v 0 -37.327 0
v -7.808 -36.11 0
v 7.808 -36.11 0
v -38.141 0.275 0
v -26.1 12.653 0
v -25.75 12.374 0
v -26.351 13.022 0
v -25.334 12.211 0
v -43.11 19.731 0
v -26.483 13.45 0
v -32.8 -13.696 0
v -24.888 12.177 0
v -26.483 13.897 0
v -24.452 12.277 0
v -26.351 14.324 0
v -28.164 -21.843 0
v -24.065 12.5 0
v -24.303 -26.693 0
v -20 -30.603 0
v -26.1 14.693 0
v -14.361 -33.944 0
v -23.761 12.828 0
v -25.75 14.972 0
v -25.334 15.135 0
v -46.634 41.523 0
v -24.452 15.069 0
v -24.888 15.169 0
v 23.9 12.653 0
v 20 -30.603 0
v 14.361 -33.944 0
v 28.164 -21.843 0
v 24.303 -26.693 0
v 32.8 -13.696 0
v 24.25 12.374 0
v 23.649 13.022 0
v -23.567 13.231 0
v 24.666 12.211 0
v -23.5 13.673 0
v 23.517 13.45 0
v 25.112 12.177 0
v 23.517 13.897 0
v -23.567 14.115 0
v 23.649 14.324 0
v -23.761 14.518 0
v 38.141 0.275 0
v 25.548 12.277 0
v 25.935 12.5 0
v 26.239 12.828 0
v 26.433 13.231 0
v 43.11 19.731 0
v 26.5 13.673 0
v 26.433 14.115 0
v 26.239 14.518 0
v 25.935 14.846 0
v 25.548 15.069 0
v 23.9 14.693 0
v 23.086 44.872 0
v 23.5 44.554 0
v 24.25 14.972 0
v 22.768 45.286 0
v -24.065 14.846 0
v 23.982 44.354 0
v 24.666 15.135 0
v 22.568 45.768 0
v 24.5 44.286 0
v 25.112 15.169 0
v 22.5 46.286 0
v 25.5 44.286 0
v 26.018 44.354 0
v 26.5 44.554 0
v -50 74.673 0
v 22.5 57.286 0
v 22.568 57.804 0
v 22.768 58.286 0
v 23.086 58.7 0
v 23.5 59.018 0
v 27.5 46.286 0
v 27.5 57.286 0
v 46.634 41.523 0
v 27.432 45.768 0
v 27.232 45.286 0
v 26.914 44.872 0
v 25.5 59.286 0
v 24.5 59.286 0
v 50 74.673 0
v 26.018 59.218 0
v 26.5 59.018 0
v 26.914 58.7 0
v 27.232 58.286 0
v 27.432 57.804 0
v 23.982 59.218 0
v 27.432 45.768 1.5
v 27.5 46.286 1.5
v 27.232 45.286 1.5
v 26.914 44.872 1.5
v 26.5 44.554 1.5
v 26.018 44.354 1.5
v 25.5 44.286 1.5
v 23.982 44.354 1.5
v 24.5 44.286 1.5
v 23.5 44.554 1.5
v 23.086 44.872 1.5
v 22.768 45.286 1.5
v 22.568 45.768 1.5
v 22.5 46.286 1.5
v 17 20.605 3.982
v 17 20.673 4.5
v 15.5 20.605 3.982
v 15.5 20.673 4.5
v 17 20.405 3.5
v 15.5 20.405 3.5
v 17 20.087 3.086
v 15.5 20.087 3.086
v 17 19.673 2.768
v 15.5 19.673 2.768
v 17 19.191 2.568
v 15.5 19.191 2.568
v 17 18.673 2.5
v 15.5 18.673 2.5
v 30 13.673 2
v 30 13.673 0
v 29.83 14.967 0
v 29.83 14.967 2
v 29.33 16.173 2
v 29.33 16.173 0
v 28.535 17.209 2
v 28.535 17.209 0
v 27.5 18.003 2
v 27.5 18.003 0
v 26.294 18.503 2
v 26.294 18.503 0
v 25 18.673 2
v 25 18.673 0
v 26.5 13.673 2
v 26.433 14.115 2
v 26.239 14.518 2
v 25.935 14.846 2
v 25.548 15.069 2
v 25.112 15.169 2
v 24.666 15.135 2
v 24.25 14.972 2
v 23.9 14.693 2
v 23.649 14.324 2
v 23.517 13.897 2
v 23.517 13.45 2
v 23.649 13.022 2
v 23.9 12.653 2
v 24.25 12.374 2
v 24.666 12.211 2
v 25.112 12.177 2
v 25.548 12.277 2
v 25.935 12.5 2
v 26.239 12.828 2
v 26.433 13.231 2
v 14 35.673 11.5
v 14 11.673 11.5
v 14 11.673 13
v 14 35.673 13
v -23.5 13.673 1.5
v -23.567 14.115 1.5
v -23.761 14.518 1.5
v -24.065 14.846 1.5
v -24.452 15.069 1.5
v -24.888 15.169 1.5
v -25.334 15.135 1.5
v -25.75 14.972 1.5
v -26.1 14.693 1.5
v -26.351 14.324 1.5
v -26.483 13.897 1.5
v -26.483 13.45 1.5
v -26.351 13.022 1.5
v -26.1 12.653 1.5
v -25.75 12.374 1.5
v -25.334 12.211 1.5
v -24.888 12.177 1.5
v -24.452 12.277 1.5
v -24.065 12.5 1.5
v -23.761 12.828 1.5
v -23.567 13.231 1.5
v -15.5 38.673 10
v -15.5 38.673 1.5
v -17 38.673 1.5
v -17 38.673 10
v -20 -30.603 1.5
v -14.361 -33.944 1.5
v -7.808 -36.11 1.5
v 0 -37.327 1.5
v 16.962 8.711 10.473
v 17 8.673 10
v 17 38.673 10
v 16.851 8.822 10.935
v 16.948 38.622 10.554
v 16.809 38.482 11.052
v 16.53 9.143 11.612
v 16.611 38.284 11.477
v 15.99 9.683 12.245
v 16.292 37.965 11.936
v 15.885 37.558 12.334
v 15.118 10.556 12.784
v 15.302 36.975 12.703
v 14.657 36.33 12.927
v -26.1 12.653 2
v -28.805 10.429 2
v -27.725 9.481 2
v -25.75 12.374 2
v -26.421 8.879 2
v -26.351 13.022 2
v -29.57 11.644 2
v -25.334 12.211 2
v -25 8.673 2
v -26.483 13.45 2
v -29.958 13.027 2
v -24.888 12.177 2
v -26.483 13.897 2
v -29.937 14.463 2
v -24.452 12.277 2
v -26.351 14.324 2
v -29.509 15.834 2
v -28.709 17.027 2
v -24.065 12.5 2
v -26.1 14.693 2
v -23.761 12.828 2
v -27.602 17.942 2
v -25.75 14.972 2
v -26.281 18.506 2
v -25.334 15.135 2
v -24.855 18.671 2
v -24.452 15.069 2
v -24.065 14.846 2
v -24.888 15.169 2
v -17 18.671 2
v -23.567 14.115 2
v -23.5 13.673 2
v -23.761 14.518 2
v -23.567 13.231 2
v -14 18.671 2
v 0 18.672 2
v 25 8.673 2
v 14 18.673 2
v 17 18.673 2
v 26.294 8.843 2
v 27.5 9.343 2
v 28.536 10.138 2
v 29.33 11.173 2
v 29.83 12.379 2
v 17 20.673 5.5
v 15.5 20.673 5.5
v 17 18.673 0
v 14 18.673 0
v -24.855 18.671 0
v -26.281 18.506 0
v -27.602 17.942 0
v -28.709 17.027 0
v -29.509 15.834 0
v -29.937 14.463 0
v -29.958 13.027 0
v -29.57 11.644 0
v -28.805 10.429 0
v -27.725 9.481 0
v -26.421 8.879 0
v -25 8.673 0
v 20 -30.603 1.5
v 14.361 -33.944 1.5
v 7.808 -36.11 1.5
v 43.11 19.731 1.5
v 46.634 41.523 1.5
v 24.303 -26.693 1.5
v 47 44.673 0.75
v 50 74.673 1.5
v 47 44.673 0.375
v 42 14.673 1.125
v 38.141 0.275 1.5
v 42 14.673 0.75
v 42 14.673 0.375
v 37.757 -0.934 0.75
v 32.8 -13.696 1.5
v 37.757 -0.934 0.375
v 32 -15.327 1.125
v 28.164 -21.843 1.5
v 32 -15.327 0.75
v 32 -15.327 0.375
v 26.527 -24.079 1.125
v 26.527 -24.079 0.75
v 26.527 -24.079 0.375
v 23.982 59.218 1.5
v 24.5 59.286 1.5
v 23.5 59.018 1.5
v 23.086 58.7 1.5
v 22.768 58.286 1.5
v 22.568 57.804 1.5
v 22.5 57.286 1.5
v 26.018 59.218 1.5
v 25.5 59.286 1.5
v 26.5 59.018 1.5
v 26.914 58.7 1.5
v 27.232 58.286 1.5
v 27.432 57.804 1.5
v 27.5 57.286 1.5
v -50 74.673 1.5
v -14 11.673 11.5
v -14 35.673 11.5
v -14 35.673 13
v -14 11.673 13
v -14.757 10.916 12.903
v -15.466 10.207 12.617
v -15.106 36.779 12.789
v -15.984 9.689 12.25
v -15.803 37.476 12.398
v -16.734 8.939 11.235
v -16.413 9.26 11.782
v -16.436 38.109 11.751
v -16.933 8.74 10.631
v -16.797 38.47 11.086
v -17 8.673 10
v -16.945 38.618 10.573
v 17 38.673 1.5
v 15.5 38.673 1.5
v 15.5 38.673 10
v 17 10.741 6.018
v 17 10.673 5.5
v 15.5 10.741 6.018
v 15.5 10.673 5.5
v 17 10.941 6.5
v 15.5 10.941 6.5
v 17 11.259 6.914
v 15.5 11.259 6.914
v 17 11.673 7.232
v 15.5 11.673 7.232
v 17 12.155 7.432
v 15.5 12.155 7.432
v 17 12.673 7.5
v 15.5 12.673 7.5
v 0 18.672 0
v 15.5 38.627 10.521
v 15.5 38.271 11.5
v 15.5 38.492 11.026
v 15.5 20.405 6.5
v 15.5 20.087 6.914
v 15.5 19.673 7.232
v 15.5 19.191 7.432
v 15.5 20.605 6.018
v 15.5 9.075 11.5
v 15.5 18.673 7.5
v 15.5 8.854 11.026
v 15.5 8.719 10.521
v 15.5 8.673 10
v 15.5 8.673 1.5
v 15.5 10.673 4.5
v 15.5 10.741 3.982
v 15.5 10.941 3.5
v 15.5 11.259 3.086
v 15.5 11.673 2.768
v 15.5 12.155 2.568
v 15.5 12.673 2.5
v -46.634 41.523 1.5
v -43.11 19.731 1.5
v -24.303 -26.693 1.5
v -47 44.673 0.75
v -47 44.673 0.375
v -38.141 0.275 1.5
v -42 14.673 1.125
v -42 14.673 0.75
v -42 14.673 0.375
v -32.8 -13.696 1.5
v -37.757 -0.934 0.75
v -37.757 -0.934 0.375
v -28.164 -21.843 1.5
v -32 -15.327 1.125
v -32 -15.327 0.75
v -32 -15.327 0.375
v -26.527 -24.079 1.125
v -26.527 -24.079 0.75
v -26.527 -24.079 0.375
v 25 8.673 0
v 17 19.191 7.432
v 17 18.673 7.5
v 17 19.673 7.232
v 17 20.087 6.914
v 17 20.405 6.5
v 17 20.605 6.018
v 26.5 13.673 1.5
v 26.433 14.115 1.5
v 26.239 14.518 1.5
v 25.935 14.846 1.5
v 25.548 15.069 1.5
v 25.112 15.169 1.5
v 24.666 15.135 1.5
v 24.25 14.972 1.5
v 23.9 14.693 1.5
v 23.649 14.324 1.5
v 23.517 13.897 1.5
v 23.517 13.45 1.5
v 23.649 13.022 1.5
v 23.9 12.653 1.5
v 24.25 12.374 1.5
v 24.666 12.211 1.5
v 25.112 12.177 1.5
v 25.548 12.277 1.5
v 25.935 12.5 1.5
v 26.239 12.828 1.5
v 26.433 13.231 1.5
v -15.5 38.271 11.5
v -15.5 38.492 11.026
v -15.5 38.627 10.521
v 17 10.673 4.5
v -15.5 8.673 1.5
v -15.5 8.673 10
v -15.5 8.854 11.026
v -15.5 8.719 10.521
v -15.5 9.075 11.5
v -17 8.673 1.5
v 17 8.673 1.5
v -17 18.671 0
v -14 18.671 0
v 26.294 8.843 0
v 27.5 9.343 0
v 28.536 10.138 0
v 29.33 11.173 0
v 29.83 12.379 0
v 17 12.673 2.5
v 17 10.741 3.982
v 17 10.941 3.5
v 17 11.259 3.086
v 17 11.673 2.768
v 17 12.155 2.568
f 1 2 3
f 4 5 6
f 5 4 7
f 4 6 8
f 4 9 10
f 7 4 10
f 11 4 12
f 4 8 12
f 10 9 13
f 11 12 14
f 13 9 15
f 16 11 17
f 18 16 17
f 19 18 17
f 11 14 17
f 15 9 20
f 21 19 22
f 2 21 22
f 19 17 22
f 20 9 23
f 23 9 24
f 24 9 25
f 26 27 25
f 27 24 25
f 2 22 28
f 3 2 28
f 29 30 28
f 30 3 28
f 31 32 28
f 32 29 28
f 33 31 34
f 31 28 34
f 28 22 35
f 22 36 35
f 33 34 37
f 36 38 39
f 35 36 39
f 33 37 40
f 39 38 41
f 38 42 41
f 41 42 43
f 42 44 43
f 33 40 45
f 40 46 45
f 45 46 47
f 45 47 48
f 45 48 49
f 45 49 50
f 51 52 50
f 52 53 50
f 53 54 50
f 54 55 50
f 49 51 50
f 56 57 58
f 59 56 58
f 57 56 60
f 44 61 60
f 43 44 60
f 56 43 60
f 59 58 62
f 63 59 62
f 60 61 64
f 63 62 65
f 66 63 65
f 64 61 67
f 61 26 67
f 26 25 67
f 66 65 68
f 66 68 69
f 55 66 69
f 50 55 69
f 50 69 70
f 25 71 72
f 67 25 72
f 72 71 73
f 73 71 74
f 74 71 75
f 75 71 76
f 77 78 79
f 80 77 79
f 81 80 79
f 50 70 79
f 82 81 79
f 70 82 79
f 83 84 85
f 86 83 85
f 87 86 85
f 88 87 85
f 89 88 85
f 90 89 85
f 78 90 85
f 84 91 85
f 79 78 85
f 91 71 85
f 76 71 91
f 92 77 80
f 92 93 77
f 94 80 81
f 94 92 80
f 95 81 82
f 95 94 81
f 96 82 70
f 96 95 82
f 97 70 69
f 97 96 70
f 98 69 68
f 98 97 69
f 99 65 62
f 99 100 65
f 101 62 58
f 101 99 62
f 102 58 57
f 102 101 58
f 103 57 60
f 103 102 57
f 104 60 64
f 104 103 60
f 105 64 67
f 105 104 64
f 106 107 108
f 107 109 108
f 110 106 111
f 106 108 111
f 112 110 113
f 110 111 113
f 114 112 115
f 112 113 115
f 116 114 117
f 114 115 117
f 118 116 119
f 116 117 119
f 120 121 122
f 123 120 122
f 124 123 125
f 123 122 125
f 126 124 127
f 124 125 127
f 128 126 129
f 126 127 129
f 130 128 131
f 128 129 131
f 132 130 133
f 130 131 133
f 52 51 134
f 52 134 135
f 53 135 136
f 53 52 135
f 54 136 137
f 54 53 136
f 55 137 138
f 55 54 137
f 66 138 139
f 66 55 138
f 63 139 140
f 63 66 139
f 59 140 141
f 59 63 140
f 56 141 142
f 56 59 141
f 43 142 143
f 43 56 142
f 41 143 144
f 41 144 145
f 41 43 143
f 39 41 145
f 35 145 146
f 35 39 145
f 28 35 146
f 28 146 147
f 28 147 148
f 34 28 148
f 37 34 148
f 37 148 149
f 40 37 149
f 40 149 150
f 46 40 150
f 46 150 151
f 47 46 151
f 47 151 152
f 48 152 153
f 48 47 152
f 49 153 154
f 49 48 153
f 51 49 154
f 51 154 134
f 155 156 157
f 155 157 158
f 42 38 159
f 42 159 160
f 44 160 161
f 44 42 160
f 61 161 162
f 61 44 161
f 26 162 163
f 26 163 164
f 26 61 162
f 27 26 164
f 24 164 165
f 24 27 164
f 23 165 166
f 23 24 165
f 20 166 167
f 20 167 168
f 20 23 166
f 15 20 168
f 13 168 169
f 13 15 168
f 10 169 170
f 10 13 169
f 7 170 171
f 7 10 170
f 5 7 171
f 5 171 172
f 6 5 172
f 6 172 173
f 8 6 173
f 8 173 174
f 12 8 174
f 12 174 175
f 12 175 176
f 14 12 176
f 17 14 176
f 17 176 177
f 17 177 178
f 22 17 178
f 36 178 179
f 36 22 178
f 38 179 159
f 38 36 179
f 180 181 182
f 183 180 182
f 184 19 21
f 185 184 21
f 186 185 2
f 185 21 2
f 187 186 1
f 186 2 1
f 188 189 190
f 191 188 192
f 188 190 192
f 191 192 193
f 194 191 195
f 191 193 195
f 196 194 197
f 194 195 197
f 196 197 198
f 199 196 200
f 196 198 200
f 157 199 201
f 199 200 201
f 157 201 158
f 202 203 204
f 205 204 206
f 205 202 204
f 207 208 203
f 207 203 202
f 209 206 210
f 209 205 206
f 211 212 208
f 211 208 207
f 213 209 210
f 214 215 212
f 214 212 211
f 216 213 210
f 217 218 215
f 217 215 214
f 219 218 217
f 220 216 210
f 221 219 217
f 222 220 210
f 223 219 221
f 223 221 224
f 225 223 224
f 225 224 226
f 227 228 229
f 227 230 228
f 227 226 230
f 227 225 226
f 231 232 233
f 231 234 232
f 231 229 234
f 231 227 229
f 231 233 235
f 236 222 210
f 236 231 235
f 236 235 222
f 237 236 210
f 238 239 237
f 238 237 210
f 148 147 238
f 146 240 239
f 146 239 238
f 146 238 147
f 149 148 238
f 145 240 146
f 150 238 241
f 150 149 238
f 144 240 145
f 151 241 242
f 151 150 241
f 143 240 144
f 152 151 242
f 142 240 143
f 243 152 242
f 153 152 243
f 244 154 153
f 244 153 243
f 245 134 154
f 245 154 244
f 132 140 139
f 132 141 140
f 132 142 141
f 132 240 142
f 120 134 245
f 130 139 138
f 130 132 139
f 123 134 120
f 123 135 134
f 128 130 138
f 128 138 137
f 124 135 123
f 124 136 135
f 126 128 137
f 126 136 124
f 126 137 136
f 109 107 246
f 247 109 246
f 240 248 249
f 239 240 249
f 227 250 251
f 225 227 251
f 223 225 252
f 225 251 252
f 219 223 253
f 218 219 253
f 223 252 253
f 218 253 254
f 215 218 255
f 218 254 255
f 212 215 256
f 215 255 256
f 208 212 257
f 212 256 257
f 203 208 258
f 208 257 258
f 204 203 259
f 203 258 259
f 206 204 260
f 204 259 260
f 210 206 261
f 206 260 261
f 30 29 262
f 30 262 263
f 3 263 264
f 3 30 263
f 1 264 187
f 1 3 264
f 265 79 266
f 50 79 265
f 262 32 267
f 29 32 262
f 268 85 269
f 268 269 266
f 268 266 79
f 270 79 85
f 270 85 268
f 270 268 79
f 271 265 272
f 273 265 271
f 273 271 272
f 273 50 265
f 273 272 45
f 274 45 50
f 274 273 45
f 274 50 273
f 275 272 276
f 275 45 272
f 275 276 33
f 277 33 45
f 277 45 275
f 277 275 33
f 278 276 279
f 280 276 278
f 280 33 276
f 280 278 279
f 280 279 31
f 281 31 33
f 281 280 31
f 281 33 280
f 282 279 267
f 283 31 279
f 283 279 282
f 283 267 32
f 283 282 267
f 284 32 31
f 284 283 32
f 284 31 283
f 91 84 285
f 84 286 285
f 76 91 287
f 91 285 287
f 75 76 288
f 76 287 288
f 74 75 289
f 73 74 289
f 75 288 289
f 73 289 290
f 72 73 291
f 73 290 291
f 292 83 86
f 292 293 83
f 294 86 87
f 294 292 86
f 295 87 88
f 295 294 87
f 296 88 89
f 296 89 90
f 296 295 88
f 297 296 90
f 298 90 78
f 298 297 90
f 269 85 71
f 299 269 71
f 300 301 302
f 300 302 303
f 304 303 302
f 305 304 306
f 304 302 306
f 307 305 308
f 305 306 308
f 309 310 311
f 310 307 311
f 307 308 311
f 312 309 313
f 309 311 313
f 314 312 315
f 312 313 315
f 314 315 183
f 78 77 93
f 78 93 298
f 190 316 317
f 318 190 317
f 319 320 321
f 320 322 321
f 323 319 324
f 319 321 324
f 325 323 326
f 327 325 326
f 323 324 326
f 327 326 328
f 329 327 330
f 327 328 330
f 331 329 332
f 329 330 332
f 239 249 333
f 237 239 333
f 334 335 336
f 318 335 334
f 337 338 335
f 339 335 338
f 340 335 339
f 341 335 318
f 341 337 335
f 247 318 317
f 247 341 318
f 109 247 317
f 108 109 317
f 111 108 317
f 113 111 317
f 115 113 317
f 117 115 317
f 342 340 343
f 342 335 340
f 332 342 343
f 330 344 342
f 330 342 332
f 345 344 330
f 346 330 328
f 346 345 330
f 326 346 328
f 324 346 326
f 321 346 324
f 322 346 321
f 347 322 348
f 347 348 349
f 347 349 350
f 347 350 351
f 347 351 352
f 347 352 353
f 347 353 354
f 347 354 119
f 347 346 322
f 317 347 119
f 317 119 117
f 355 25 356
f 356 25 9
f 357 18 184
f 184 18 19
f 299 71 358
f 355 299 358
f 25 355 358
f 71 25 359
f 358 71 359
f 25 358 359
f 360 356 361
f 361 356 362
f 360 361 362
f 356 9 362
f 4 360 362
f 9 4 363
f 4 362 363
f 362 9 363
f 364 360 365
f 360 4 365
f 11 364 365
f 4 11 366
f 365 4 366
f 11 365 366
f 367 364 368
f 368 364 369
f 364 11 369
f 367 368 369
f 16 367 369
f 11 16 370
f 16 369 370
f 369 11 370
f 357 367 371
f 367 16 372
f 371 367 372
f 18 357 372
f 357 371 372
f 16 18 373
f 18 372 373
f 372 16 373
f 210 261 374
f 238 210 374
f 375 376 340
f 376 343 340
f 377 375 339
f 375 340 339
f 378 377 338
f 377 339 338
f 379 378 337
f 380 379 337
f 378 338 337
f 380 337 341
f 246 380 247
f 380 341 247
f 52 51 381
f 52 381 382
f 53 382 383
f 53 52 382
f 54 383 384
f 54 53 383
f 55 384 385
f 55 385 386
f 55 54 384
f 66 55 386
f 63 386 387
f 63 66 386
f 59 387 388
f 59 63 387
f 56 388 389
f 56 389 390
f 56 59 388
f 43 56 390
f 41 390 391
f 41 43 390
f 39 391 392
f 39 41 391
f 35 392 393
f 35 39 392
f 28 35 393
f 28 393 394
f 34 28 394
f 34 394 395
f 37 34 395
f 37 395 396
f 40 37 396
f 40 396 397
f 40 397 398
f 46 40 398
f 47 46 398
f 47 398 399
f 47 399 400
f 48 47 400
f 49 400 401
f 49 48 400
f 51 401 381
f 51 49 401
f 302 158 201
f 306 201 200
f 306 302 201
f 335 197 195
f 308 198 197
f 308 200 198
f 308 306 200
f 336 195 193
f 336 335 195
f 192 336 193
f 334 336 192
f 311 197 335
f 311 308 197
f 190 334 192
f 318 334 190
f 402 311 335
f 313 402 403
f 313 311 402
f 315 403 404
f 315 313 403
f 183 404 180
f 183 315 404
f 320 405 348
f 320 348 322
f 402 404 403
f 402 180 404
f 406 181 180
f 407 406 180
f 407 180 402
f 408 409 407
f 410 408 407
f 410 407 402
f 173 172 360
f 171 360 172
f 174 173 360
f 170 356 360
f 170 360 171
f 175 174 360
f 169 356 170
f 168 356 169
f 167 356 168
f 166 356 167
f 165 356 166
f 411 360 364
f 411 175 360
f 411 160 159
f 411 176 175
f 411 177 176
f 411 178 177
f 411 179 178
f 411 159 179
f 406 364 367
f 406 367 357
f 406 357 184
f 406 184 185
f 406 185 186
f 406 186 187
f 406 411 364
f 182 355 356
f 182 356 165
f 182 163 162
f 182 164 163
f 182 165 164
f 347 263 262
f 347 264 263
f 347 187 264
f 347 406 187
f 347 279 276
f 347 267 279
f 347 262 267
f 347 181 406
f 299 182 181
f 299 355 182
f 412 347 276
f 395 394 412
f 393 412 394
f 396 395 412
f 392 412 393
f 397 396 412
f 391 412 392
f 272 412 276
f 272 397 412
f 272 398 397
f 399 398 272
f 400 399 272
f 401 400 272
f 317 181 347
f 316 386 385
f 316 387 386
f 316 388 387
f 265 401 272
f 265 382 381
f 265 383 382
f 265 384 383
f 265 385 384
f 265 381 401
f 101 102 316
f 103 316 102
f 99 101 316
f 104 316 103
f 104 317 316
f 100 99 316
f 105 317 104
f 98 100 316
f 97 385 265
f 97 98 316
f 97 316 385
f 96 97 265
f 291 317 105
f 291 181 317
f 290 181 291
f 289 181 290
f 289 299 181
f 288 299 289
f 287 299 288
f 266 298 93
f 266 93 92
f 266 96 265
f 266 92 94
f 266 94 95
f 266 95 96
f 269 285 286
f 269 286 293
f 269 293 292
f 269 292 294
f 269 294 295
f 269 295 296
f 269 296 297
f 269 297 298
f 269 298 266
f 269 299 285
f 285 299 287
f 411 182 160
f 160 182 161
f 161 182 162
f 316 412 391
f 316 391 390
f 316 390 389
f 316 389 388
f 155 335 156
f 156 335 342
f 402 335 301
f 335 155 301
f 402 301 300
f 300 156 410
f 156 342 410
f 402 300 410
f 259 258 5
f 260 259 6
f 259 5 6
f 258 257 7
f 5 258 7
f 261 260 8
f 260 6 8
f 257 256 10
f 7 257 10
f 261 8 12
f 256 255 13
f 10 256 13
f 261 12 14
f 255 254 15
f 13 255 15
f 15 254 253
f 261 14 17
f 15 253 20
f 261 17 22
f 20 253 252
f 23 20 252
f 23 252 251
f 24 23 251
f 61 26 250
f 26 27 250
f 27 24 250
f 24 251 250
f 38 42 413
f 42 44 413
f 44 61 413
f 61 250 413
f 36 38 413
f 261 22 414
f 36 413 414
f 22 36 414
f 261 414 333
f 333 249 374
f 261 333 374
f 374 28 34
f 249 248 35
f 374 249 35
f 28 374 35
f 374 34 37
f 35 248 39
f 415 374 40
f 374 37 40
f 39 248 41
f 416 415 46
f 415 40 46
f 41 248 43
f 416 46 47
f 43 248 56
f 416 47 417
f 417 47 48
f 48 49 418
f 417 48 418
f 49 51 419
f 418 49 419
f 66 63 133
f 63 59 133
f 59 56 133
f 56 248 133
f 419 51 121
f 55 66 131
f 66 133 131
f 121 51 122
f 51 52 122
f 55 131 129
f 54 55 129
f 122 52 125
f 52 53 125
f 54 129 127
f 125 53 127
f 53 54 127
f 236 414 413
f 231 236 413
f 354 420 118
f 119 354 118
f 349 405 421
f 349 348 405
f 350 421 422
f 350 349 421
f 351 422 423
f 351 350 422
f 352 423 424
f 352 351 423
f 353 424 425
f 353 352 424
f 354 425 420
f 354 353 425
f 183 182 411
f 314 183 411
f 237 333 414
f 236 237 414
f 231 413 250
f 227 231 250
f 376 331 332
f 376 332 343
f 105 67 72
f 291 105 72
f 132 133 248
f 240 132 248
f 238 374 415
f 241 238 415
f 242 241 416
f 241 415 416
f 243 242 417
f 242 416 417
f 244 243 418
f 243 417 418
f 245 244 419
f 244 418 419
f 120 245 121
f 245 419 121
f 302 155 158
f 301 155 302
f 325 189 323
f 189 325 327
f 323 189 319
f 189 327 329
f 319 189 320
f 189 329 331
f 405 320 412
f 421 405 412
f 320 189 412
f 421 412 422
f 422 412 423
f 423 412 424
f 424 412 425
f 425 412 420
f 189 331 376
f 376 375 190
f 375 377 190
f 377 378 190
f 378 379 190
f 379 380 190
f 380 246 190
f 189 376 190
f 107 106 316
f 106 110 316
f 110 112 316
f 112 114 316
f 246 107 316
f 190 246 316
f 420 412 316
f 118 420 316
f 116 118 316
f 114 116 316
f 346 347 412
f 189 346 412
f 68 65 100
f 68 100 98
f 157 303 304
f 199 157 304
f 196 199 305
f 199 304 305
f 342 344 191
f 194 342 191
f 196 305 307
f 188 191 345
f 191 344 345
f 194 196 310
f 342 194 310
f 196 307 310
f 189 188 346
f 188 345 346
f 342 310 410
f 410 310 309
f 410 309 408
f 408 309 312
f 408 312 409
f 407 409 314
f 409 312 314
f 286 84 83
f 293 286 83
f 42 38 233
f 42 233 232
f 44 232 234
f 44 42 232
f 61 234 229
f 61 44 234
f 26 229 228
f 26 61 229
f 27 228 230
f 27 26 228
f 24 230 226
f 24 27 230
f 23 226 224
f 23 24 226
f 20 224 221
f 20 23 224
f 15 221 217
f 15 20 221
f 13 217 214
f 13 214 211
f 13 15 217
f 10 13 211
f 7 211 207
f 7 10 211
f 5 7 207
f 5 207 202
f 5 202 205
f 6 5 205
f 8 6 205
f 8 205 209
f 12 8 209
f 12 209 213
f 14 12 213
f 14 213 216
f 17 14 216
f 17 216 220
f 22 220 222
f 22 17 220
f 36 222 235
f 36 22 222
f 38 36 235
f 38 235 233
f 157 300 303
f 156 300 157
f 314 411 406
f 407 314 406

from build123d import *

# Parameters (mm, degrees)
F0_R        = 6
F0_W        = 5
F0_H        = 15
F0_R_2      = 3
F0_R_3      = 1.5
F1_DEPTH    = 1.5
F2_DEPTH    = 13
F3_T        = -1.5
F4_T1_DEPTH = 45
F4_T3_DEPTH = 49
F5_R        = 2
F6_DEPTH    = 2
F7_START    = 3
F7_DEPTH    = 22
F8_W        = 10
F8_H        = 5
F9_DEPTH    = 5
F10_R       = 2


# Not quite as in the source:
# - a fillet or chamfer that OpenCascade refuses, or shapes differently, is made with other operations: its cross-section is extruded or revolved along the edge and cut away or added


with BuildPart() as f1:
    # F0 (on Top) → F1 (new body)
    with BuildSketch(Plane.XY):
        with BuildLine():
            Line((50, 74.6730720997), (0, 74.6730720997))
            Line((0, 74.6730720997), (0, 69.6730720997))
            Line((0, 69.6730720997), (0, 64.6730720997))
            Line((0, 64.6730720997), (0, 38.6730720997))
            Line((0, 38.6730720997), (17, 38.6730720997))
            Line((17, 38.6730720997), (17, 18.6727328867))
            Line((17, 18.6727328867), (24.9997879891, 18.6730720952))
            ThreePointArc((24.9997879891, 18.6730720952), (28.535458948, 17.208680962), (30, 13.6730720997))
            ThreePointArc((30, 13.6730720997), (28.5355339059, 10.1375381938), (25, 8.6730720997))
            Line((25, 8.6730720997), (17, 8.6730720997))
            Line((17, 8.6730720997), (0, 8.6730720997))
            Line((0, 8.6730720997), (0, 7.6730720997))
            Line((0, 7.6730720997), (20, 7.6730720997))
            Line((20, 7.6730720997), (20, -1.4825001728))
            ThreePointArc((20, -1.4825001728), (23.3406734607, -3.5949503292), (24.642552197, -7.3269279003))
            ThreePointArc((24.642552197, -7.3269279003), (23.3406734607, -11.0589054714), (20, -13.1713556278))
            Line((20, -13.1713556278), (20, -30.6029154708))
            add(Edge.make_bspline(
                [(50, 74.6730720997), (49.0459845068, 66.9929651356), (47.3037907792, 43.380231158), (42.8042626578, 15.237762147), (33.9460152145, -15.0102641191), (24.7180314416, -27.0363946308), (20, -30.6029154708)],
                knots=[0, 0, 0, 0, 0.2142082733, 0.4293529985, 0.6487321082, 0.8142938826, 0.8142938826, 0.8142938826, 0.8142938826], degree=3))
        make_face()
        with Locations((29.4684451073, 27.5630913675)):
            Circle(F0_R, mode=Mode.SUBTRACT)
        with Locations((15, 61.6730720997)):
            Circle(F0_R, mode=Mode.SUBTRACT)
        with Locations((25, 51.7858859897)):
            Rectangle(F0_W, F0_H, mode=Mode.SUBTRACT)
        with Locations((35, 61.6730720997)):
            Circle(F0_R, mode=Mode.SUBTRACT)
        with BuildLine():
            Line((0, 69.6730720997), (0, 74.6730720997))
            Line((0, 74.6730720997), (-50, 74.6730720997))
            add(Edge.make_bspline(
                [(-50, 74.6730720997), (-49.0459845068, 66.9929651356), (-47.3037907792, 43.380231158), (-42.8042626578, 15.237762147), (-33.9460152145, -15.0102641191), (-24.7180314416, -27.0363946308), (-20, -30.6029154708)],
                knots=[0, 0, 0, 0, 0.2142082733, 0.4293529985, 0.6487321082, 0.8142938826, 0.8142938826, 0.8142938826, 0.8142938826], degree=3))
            Line((-20, -30.6029154708), (-20, -13.1713556278))
            ThreePointArc((-20, -13.1713556278), (-24.642552197, -7.3269279003), (-20, -1.4825001728))
            Line((-20, -1.4825001728), (-20, 7.6730720997))
            Line((-20, 7.6730720997), (0, 7.6730720997))
            Line((0, 7.6730720997), (0, 8.6730720997))
            Line((0, 8.6730720997), (-17, 8.6730720997))
            Line((-17, 8.6730720997), (-25, 8.6730720997))
            ThreePointArc((-25, 8.6730720997), (-29.999471487, 13.7457690764), (-24.854621415, 18.6709581595))
            Line((-24.854621415, 18.6709581595), (-17, 18.6712912126))
            Line((-17, 18.6712912126), (-17, 38.6730720997))
            Line((-17, 38.6730720997), (0, 38.6730720997))
            Line((0, 38.6730720997), (0, 64.6730720997))
            Line((0, 64.6730720997), (0, 69.6730720997))
        make_face()
        with Locations((-29.4684451073, 27.5630913675)):
            Circle(F0_R, mode=Mode.SUBTRACT)
        with Locations((-35, 61.6730720997)):
            Circle(F0_R, mode=Mode.SUBTRACT)
        with Locations((-25, 47.6730720997)):
            Circle(F0_R, mode=Mode.SUBTRACT)
        with Locations((-15, 61.6730720997)):
            Circle(F0_R, mode=Mode.SUBTRACT)
        with BuildLine():
            add(Edge.make_bspline(
                [(20, -30.6029154708), (19.6703346362, -30.85212076), (14.3195363247, -34.7267287684), (8.0180540099, -36.5596981444), (0, -37.3269279003)],
                knots=[0.8142938826, 0.8142938826, 0.8142938826, 0.8142938826, 0.825862263, 1, 1, 1, 1], degree=3))
            Line((20, -30.6029154708), (20, -13.1713556278))
            ThreePointArc((20, -13.1713556278), (12.642552197, -7.3269279003), (20, -1.4825001728))
            Line((20, -1.4825001728), (20, 7.6730720997))
            Line((20, 7.6730720997), (0, 7.6730720997))
            Line((0, 7.6730720997), (0, -1.3269279003))
            ThreePointArc((0, -1.3269279003), (4.2426406871, -3.0842872132), (6, -7.3269279003))
            ThreePointArc((6, -7.3269279003), (4.2426406871, -11.5695685874), (0, -13.3269279003))
            Line((0, -13.3269279003), (0, -21.1192360669))
            ThreePointArc((0, -21.1192360669), (4.2426406871, -22.8765953798), (6, -27.1192360669))
            ThreePointArc((6, -27.1192360669), (4.2426406871, -31.3618767541), (0, -33.1192360669))
            Line((0, -33.1192360669), (0, -37.3269279003))
        make_face()
        with BuildLine():
            Line((-20, -13.1713556278), (-20, -30.6029154708))
            add(Edge.make_bspline(
                [(-20, -30.6029154708), (-19.6703346362, -30.85212076), (-14.3195363247, -34.7267287684), (-8.0180540099, -36.5596981444), (0, -37.3269279003)],
                knots=[0.8142938826, 0.8142938826, 0.8142938826, 0.8142938826, 0.825862263, 1, 1, 1, 1], degree=3))
            Line((0, -37.3269279003), (0, -33.1192360669))
            ThreePointArc((0, -33.1192360669), (-6, -27.1192360669), (0, -21.1192360669))
            Line((0, -21.1192360669), (0, -13.3269279003))
            ThreePointArc((0, -13.3269279003), (-6, -7.3269279003), (0, -1.3269279003))
            Line((0, -1.3269279003), (0, 7.6730720997))
            Line((0, 7.6730720997), (-20, 7.6730720997))
            Line((-20, 7.6730720997), (-20, -1.4825001728))
            ThreePointArc((-20, -1.4825001728), (-14.9105746259, -2.6288066365), (-12.642552197, -7.3269279003))
            ThreePointArc((-12.642552197, -7.3269279003), (-14.9105746259, -12.0250491641), (-20, -13.1713556278))
        make_face()
        with BuildLine():
            ThreePointArc((20, -1.4825001728), (12.642552197, -7.3269279003), (20, -13.1713556278))
            Line((20, -13.1713556278), (20, -1.4825001728))
        make_face()
        with BuildLine():
            Line((20, -1.4825001728), (20, -13.1713556278))
            ThreePointArc((20, -13.1713556278), (23.3406734607, -11.0589054714), (24.642552197, -7.3269279003))
            ThreePointArc((24.642552197, -7.3269279003), (23.3406734607, -3.5949503292), (20, -1.4825001728))
        make_face()
        Polygon((17, 38.6730720997), (0, 38.6730720997), (0, 35.6730720997), (14, 35.6730720997), (14, 18.6726056802), (17, 18.6727328867), align=None)
        Polygon((0, 35.6730720997), (0, 38.6730720997), (-17, 38.6730720997), (-17, 18.6712912126), (-14, 18.6714184191), (-14, 35.6730720997), align=None)
        with BuildLine():
            ThreePointArc((-20, -1.4825001728), (-24.642552197, -7.3269279003), (-20, -13.1713556278))
            Line((-20, -13.1713556278), (-20, -1.4825001728))
        make_face()
        with BuildLine():
            Line((-20, -1.4825001728), (-20, -13.1713556278))
            ThreePointArc((-20, -13.1713556278), (-14.9105746259, -12.0250491641), (-12.642552197, -7.3269279003))
            ThreePointArc((-12.642552197, -7.3269279003), (-14.9105746259, -2.6288066365), (-20, -1.4825001728))
        make_face()
        with BuildLine():
            ThreePointArc((0, -21.1192360669), (-6, -27.1192360669), (0, -33.1192360669))
            Line((0, -33.1192360669), (0, -21.1192360669))
        make_face()
        with BuildLine():
            Line((0, -21.1192360669), (0, -33.1192360669))
            ThreePointArc((0, -33.1192360669), (4.2426406871, -31.3618767541), (6, -27.1192360669))
            ThreePointArc((6, -27.1192360669), (4.2426406871, -22.8765953798), (0, -21.1192360669))
        make_face()
        Polygon((14, 35.6730720997), (0, 35.6730720997), (0, 18.6720120497), (14, 18.6726056802), align=None)
        Polygon((0, 18.6720120497), (0, 35.6730720997), (-14, 35.6730720997), (-14, 18.6714184191), align=None)
        Polygon((14, 18.6726056802), (0, 18.6720120497), (0, 11.6730720997), (14, 11.6730720997), align=None)
        Polygon((0, 11.6730720997), (0, 18.6720120497), (-14, 18.6714184191), (-14, 11.6730720997), align=None)
        with BuildLine():
            Line((24.9997879891, 18.6730720952), (17, 18.6727328867))
            Line((17, 18.6727328867), (17, 8.6730720997))
            Line((17, 8.6730720997), (25, 8.6730720997))
            ThreePointArc((25, 8.6730720997), (20.0000000011, 13.6729660942), (24.9997879891, 18.6730720952))
        make_face()
        Polygon((17, 8.6730720997), (17, 18.6727328867), (14, 18.6726056802), (14, 11.6730720997), (0, 11.6730720997), (0, 8.6730720997), align=None)
        Polygon((-14, 18.6714184191), (-17, 18.6712912126), (-17, 8.6730720997), (0, 8.6730720997), (0, 11.6730720997), (-14, 11.6730720997), align=None)
        with BuildLine():
            Line((-17, 8.6730720997), (-17, 18.6712912126))
            Line((-17, 18.6712912126), (-24.854621415, 18.6709581595))
            ThreePointArc((-24.854621415, 18.6709581595), (-21.4134352839, 17.1568277653), (-20, 13.6730720997))
            ThreePointArc((-20, 13.6730720997), (-21.4644660941, 10.1375381938), (-25, 8.6730720997))
            Line((-25, 8.6730720997), (-17, 8.6730720997))
        make_face()
        with BuildLine():
            ThreePointArc((0, -1.3269279003), (-6, -7.3269279003), (0, -13.3269279003))
            Line((0, -13.3269279003), (0, -1.3269279003))
        make_face()
        with BuildLine():
            Line((0, -1.3269279003), (0, -13.3269279003))
            ThreePointArc((0, -13.3269279003), (4.2426406871, -11.5695685874), (6, -7.3269279003))
            ThreePointArc((6, -7.3269279003), (4.2426406871, -3.0842872132), (0, -1.3269279003))
        make_face()
        with BuildLine():
            ThreePointArc((30, 13.6730720997), (28.535458948, 17.208680962), (24.9997879891, 18.6730720952))
            ThreePointArc((24.9997879891, 18.6730720952), (20.0000000011, 13.6729660942), (25, 8.6730720997))
            ThreePointArc((25, 8.6730720997), (28.5355339059, 10.1375381938), (30, 13.6730720997))
        make_face()
        with Locations((25, 13.6730720997)):
            Circle(F0_R_2, mode=Mode.SUBTRACT)
        with BuildLine():
            ThreePointArc((-20, 13.6730720997), (-21.4134352839, 17.1568277653), (-24.854621415, 18.6709581595))
            ThreePointArc((-24.854621415, 18.6709581595), (-29.999471487, 13.7457690764), (-25, 8.6730720997))
            ThreePointArc((-25, 8.6730720997), (-21.4644660941, 10.1375381938), (-20, 13.6730720997))
        make_face()
        with Locations((-25, 13.6730720997)):
            Circle(F0_R_2, mode=Mode.SUBTRACT)
        with Locations((-25, 13.6730720997)):
            Circle(F0_R_2)
        with Locations((-25, 13.6730720997)):
            Circle(F0_R_3, mode=Mode.SUBTRACT)
        with Locations((25, 13.6730720997)):
            Circle(F0_R_2)
        with Locations((25, 13.6730720997)):
            Circle(F0_R_3, mode=Mode.SUBTRACT)
        with Locations((-35, 61.6730720997)):
            Circle(F0_R)
        with Locations((-15, 61.6730720997)):
            Circle(F0_R)
        with Locations((-25, 47.6730720997)):
            Circle(F0_R)
        with Locations((-29.4684451073, 27.5630913675)):
            Circle(F0_R)
        with Locations((35, 61.6730720997)):
            Circle(F0_R)
        with Locations((29.4684451073, 27.5630913675)):
            Circle(F0_R)
        with Locations((15, 61.6730720997)):
            Circle(F0_R)
    extrude(amount=F1_DEPTH)

    # F0 (on Top) → F2 (join)
    with BuildSketch(Plane.XY):
        Polygon((0, 18.6720120497), (0, 35.6730720997), (-14, 35.6730720997), (-14, 18.6714184191), align=None)
        Polygon((14, 35.6730720997), (0, 35.6730720997), (0, 18.6720120497), (14, 18.6726056802), align=None)
        Polygon((14, 18.6726056802), (0, 18.6720120497), (0, 11.6730720997), (14, 11.6730720997), align=None)
        Polygon((0, 11.6730720997), (0, 18.6720120497), (-14, 18.6714184191), (-14, 11.6730720997), align=None)
        Polygon((0, 35.6730720997), (0, 38.6730720997), (-17, 38.6730720997), (-17, 18.6712912126), (-14, 18.6714184191), (-14, 35.6730720997), align=None)
        Polygon((17, 38.6730720997), (0, 38.6730720997), (0, 35.6730720997), (14, 35.6730720997), (14, 18.6726056802), (17, 18.6727328867), align=None)
        Polygon((17, 8.6730720997), (17, 18.6727328867), (14, 18.6726056802), (14, 11.6730720997), (0, 11.6730720997), (0, 8.6730720997), align=None)
        Polygon((-14, 18.6714184191), (-17, 18.6712912126), (-17, 8.6730720997), (0, 8.6730720997), (0, 11.6730720997), (-14, 11.6730720997), align=None)
    extrude(amount=F2_DEPTH)

    # F3: a shell. OpenCascade refuses it in one call, so the cavity is built on its own and cut out:
    # the body offset inwards by the wall thickness, plus a prism from it out through each open face.
    f3_core = offset(f1.part, amount=F3_T, kind=Kind.INTERSECTION, mode=Mode.PRIVATE)
    f3_exits = [f3_core.faces().sort_by_distance(p)[0] for p in [
        (0, 10.173072, 6.5),
        (0, 37.173072, 6.5),
    ]]
    add(f3_core, mode=Mode.SUBTRACT)
    extrude(f3_exits, amount=-F3_T, mode=Mode.SUBTRACT)

    # F4: fillet of radius 3 on 4 edges, made by hand

    # F4_s2 → F4_t1 (cut)
    with BuildSketch(Plane.XZ.offset(-46.1730720997)):
        with BuildLine():
            ThreePointArc((-14, 13), (-16.1213203436, 12.1213203436), (-17, 10))
            Line((-17, 10), (-17, 13))
            Line((-17, 13), (-14, 13))
        make_face()
        with BuildLine():
            ThreePointArc((17, 10), (16.1213203436, 12.1213203436), (14, 13))
            Line((14, 13), (17, 13))
            Line((17, 13), (17, 10))
        make_face()
    extrude(amount=F4_T1_DEPTH, mode=Mode.SUBTRACT)

    # F4_s4 → F4_t3 (cut)
    with BuildSketch(Plane.YZ.offset(-24.5)):
        with BuildLine():
            ThreePointArc((11.6730720997, 13), (9.5517517561, 12.1213203436), (8.6730720997, 10))
            Line((8.6730720997, 10), (8.6730720997, 13))
            Line((8.6730720997, 13), (11.6730720997, 13))
        make_face()
        with BuildLine():
            ThreePointArc((35.6730720997, 13), (37.7943924432, 12.1213203436), (38.6730720997, 10))
            Line((38.6730720997, 10), (38.6730720997, 13))
            Line((38.6730720997, 13), (35.6730720997, 13))
        make_face()
    extrude(amount=F4_T3_DEPTH, mode=Mode.SUBTRACT)

    # F5
    f5_edges = [f1.edges().sort_by_distance(p)[0] for p in [
        (22.5, 59.285886, 0.75),
        (27.5, 59.285886, 0.75),
        (27.5, 44.285886, 0.75),
        (22.5, 44.285886, 0.75),
    ]]
    fillet(f5_edges, radius=F5_R)

    # F0 (on Top) → F7 (cut)
    with BuildSketch(Plane.XY.offset(F7_START)):
        Polygon((0, 18.6720120497), (0, 35.6730720997), (-14, 35.6730720997), (-14, 18.6714184191), align=None)
        Polygon((14, 35.6730720997), (0, 35.6730720997), (0, 18.6720120497), (14, 18.6726056802), align=None)
        Polygon((14, 18.6726056802), (0, 18.6720120497), (0, 11.6730720997), (14, 11.6730720997), align=None)
        Polygon((0, 11.6730720997), (0, 18.6720120497), (-14, 18.6714184191), (-14, 11.6730720997), align=None)
    extrude(amount=F7_DEPTH, mode=Mode.SUBTRACT)

    # F8 (on face) → F9 (cut)
    with BuildSketch(Plane.YZ.offset(17)):
        with Locations((15.6730720997, 5)):
            Rectangle(F8_W, F8_H)
    extrude(amount=-F9_DEPTH, mode=Mode.SUBTRACT)

    # F10
    f10_edges = [f1.edges().sort_by_distance(p)[0] for p in [
        (16.25, 20.673072, 2.5),
        (16.25, 20.673072, 7.5),
        (16.25, 10.673072, 7.5),
        (16.25, 10.673072, 2.5),
    ]]
    fillet(f10_edges, radius=F10_R)


with BuildPart() as f6:
    # F0 (on Top) → F6 (new body)
    with BuildSketch(Plane.XY):
        Polygon((14, 18.6726056802), (0, 18.6720120497), (0, 11.6730720997), (14, 11.6730720997), align=None)
        Polygon((0, 11.6730720997), (0, 18.6720120497), (-14, 18.6714184191), (-14, 11.6730720997), align=None)
        with BuildLine():
            Line((24.9997879891, 18.6730720952), (17, 18.6727328867))
            Line((17, 18.6727328867), (17, 8.6730720997))
            Line((17, 8.6730720997), (25, 8.6730720997))
            ThreePointArc((25, 8.6730720997), (20.0000000011, 13.6729660942), (24.9997879891, 18.6730720952))
        make_face()
        Polygon((17, 8.6730720997), (17, 18.6727328867), (14, 18.6726056802), (14, 11.6730720997), (0, 11.6730720997), (0, 8.6730720997), align=None)
        Polygon((-14, 18.6714184191), (-17, 18.6712912126), (-17, 8.6730720997), (0, 8.6730720997), (0, 11.6730720997), (-14, 11.6730720997), align=None)
        with BuildLine():
            Line((-17, 8.6730720997), (-17, 18.6712912126))
            Line((-17, 18.6712912126), (-24.854621415, 18.6709581595))
            ThreePointArc((-24.854621415, 18.6709581595), (-21.4134352839, 17.1568277653), (-20, 13.6730720997))
            ThreePointArc((-20, 13.6730720997), (-21.4644660941, 10.1375381938), (-25, 8.6730720997))
            Line((-25, 8.6730720997), (-17, 8.6730720997))
        make_face()
        with BuildLine():
            ThreePointArc((30, 13.6730720997), (28.535458948, 17.208680962), (24.9997879891, 18.6730720952))
            ThreePointArc((24.9997879891, 18.6730720952), (20.0000000011, 13.6729660942), (25, 8.6730720997))
            ThreePointArc((25, 8.6730720997), (28.5355339059, 10.1375381938), (30, 13.6730720997))
        make_face()
        with Locations((25, 13.6730720997)):
            Circle(F0_R_2, mode=Mode.SUBTRACT)
        with BuildLine():
            ThreePointArc((-20, 13.6730720997), (-21.4134352839, 17.1568277653), (-24.854621415, 18.6709581595))
            ThreePointArc((-24.854621415, 18.6709581595), (-29.999471487, 13.7457690764), (-25, 8.6730720997))
            ThreePointArc((-25, 8.6730720997), (-21.4644660941, 10.1375381938), (-20, 13.6730720997))
        make_face()
        with Locations((-25, 13.6730720997)):
            Circle(F0_R_2, mode=Mode.SUBTRACT)
        with Locations((-25, 13.6730720997)):
            Circle(F0_R_2)
        with Locations((-25, 13.6730720997)):
            Circle(F0_R_3, mode=Mode.SUBTRACT)
        with Locations((25, 13.6730720997)):
            Circle(F0_R_2)
        with Locations((25, 13.6730720997)):
            Circle(F0_R_3, mode=Mode.SUBTRACT)
    extrude(amount=F6_DEPTH)


solid = Compound([f1.part, f6.part])
